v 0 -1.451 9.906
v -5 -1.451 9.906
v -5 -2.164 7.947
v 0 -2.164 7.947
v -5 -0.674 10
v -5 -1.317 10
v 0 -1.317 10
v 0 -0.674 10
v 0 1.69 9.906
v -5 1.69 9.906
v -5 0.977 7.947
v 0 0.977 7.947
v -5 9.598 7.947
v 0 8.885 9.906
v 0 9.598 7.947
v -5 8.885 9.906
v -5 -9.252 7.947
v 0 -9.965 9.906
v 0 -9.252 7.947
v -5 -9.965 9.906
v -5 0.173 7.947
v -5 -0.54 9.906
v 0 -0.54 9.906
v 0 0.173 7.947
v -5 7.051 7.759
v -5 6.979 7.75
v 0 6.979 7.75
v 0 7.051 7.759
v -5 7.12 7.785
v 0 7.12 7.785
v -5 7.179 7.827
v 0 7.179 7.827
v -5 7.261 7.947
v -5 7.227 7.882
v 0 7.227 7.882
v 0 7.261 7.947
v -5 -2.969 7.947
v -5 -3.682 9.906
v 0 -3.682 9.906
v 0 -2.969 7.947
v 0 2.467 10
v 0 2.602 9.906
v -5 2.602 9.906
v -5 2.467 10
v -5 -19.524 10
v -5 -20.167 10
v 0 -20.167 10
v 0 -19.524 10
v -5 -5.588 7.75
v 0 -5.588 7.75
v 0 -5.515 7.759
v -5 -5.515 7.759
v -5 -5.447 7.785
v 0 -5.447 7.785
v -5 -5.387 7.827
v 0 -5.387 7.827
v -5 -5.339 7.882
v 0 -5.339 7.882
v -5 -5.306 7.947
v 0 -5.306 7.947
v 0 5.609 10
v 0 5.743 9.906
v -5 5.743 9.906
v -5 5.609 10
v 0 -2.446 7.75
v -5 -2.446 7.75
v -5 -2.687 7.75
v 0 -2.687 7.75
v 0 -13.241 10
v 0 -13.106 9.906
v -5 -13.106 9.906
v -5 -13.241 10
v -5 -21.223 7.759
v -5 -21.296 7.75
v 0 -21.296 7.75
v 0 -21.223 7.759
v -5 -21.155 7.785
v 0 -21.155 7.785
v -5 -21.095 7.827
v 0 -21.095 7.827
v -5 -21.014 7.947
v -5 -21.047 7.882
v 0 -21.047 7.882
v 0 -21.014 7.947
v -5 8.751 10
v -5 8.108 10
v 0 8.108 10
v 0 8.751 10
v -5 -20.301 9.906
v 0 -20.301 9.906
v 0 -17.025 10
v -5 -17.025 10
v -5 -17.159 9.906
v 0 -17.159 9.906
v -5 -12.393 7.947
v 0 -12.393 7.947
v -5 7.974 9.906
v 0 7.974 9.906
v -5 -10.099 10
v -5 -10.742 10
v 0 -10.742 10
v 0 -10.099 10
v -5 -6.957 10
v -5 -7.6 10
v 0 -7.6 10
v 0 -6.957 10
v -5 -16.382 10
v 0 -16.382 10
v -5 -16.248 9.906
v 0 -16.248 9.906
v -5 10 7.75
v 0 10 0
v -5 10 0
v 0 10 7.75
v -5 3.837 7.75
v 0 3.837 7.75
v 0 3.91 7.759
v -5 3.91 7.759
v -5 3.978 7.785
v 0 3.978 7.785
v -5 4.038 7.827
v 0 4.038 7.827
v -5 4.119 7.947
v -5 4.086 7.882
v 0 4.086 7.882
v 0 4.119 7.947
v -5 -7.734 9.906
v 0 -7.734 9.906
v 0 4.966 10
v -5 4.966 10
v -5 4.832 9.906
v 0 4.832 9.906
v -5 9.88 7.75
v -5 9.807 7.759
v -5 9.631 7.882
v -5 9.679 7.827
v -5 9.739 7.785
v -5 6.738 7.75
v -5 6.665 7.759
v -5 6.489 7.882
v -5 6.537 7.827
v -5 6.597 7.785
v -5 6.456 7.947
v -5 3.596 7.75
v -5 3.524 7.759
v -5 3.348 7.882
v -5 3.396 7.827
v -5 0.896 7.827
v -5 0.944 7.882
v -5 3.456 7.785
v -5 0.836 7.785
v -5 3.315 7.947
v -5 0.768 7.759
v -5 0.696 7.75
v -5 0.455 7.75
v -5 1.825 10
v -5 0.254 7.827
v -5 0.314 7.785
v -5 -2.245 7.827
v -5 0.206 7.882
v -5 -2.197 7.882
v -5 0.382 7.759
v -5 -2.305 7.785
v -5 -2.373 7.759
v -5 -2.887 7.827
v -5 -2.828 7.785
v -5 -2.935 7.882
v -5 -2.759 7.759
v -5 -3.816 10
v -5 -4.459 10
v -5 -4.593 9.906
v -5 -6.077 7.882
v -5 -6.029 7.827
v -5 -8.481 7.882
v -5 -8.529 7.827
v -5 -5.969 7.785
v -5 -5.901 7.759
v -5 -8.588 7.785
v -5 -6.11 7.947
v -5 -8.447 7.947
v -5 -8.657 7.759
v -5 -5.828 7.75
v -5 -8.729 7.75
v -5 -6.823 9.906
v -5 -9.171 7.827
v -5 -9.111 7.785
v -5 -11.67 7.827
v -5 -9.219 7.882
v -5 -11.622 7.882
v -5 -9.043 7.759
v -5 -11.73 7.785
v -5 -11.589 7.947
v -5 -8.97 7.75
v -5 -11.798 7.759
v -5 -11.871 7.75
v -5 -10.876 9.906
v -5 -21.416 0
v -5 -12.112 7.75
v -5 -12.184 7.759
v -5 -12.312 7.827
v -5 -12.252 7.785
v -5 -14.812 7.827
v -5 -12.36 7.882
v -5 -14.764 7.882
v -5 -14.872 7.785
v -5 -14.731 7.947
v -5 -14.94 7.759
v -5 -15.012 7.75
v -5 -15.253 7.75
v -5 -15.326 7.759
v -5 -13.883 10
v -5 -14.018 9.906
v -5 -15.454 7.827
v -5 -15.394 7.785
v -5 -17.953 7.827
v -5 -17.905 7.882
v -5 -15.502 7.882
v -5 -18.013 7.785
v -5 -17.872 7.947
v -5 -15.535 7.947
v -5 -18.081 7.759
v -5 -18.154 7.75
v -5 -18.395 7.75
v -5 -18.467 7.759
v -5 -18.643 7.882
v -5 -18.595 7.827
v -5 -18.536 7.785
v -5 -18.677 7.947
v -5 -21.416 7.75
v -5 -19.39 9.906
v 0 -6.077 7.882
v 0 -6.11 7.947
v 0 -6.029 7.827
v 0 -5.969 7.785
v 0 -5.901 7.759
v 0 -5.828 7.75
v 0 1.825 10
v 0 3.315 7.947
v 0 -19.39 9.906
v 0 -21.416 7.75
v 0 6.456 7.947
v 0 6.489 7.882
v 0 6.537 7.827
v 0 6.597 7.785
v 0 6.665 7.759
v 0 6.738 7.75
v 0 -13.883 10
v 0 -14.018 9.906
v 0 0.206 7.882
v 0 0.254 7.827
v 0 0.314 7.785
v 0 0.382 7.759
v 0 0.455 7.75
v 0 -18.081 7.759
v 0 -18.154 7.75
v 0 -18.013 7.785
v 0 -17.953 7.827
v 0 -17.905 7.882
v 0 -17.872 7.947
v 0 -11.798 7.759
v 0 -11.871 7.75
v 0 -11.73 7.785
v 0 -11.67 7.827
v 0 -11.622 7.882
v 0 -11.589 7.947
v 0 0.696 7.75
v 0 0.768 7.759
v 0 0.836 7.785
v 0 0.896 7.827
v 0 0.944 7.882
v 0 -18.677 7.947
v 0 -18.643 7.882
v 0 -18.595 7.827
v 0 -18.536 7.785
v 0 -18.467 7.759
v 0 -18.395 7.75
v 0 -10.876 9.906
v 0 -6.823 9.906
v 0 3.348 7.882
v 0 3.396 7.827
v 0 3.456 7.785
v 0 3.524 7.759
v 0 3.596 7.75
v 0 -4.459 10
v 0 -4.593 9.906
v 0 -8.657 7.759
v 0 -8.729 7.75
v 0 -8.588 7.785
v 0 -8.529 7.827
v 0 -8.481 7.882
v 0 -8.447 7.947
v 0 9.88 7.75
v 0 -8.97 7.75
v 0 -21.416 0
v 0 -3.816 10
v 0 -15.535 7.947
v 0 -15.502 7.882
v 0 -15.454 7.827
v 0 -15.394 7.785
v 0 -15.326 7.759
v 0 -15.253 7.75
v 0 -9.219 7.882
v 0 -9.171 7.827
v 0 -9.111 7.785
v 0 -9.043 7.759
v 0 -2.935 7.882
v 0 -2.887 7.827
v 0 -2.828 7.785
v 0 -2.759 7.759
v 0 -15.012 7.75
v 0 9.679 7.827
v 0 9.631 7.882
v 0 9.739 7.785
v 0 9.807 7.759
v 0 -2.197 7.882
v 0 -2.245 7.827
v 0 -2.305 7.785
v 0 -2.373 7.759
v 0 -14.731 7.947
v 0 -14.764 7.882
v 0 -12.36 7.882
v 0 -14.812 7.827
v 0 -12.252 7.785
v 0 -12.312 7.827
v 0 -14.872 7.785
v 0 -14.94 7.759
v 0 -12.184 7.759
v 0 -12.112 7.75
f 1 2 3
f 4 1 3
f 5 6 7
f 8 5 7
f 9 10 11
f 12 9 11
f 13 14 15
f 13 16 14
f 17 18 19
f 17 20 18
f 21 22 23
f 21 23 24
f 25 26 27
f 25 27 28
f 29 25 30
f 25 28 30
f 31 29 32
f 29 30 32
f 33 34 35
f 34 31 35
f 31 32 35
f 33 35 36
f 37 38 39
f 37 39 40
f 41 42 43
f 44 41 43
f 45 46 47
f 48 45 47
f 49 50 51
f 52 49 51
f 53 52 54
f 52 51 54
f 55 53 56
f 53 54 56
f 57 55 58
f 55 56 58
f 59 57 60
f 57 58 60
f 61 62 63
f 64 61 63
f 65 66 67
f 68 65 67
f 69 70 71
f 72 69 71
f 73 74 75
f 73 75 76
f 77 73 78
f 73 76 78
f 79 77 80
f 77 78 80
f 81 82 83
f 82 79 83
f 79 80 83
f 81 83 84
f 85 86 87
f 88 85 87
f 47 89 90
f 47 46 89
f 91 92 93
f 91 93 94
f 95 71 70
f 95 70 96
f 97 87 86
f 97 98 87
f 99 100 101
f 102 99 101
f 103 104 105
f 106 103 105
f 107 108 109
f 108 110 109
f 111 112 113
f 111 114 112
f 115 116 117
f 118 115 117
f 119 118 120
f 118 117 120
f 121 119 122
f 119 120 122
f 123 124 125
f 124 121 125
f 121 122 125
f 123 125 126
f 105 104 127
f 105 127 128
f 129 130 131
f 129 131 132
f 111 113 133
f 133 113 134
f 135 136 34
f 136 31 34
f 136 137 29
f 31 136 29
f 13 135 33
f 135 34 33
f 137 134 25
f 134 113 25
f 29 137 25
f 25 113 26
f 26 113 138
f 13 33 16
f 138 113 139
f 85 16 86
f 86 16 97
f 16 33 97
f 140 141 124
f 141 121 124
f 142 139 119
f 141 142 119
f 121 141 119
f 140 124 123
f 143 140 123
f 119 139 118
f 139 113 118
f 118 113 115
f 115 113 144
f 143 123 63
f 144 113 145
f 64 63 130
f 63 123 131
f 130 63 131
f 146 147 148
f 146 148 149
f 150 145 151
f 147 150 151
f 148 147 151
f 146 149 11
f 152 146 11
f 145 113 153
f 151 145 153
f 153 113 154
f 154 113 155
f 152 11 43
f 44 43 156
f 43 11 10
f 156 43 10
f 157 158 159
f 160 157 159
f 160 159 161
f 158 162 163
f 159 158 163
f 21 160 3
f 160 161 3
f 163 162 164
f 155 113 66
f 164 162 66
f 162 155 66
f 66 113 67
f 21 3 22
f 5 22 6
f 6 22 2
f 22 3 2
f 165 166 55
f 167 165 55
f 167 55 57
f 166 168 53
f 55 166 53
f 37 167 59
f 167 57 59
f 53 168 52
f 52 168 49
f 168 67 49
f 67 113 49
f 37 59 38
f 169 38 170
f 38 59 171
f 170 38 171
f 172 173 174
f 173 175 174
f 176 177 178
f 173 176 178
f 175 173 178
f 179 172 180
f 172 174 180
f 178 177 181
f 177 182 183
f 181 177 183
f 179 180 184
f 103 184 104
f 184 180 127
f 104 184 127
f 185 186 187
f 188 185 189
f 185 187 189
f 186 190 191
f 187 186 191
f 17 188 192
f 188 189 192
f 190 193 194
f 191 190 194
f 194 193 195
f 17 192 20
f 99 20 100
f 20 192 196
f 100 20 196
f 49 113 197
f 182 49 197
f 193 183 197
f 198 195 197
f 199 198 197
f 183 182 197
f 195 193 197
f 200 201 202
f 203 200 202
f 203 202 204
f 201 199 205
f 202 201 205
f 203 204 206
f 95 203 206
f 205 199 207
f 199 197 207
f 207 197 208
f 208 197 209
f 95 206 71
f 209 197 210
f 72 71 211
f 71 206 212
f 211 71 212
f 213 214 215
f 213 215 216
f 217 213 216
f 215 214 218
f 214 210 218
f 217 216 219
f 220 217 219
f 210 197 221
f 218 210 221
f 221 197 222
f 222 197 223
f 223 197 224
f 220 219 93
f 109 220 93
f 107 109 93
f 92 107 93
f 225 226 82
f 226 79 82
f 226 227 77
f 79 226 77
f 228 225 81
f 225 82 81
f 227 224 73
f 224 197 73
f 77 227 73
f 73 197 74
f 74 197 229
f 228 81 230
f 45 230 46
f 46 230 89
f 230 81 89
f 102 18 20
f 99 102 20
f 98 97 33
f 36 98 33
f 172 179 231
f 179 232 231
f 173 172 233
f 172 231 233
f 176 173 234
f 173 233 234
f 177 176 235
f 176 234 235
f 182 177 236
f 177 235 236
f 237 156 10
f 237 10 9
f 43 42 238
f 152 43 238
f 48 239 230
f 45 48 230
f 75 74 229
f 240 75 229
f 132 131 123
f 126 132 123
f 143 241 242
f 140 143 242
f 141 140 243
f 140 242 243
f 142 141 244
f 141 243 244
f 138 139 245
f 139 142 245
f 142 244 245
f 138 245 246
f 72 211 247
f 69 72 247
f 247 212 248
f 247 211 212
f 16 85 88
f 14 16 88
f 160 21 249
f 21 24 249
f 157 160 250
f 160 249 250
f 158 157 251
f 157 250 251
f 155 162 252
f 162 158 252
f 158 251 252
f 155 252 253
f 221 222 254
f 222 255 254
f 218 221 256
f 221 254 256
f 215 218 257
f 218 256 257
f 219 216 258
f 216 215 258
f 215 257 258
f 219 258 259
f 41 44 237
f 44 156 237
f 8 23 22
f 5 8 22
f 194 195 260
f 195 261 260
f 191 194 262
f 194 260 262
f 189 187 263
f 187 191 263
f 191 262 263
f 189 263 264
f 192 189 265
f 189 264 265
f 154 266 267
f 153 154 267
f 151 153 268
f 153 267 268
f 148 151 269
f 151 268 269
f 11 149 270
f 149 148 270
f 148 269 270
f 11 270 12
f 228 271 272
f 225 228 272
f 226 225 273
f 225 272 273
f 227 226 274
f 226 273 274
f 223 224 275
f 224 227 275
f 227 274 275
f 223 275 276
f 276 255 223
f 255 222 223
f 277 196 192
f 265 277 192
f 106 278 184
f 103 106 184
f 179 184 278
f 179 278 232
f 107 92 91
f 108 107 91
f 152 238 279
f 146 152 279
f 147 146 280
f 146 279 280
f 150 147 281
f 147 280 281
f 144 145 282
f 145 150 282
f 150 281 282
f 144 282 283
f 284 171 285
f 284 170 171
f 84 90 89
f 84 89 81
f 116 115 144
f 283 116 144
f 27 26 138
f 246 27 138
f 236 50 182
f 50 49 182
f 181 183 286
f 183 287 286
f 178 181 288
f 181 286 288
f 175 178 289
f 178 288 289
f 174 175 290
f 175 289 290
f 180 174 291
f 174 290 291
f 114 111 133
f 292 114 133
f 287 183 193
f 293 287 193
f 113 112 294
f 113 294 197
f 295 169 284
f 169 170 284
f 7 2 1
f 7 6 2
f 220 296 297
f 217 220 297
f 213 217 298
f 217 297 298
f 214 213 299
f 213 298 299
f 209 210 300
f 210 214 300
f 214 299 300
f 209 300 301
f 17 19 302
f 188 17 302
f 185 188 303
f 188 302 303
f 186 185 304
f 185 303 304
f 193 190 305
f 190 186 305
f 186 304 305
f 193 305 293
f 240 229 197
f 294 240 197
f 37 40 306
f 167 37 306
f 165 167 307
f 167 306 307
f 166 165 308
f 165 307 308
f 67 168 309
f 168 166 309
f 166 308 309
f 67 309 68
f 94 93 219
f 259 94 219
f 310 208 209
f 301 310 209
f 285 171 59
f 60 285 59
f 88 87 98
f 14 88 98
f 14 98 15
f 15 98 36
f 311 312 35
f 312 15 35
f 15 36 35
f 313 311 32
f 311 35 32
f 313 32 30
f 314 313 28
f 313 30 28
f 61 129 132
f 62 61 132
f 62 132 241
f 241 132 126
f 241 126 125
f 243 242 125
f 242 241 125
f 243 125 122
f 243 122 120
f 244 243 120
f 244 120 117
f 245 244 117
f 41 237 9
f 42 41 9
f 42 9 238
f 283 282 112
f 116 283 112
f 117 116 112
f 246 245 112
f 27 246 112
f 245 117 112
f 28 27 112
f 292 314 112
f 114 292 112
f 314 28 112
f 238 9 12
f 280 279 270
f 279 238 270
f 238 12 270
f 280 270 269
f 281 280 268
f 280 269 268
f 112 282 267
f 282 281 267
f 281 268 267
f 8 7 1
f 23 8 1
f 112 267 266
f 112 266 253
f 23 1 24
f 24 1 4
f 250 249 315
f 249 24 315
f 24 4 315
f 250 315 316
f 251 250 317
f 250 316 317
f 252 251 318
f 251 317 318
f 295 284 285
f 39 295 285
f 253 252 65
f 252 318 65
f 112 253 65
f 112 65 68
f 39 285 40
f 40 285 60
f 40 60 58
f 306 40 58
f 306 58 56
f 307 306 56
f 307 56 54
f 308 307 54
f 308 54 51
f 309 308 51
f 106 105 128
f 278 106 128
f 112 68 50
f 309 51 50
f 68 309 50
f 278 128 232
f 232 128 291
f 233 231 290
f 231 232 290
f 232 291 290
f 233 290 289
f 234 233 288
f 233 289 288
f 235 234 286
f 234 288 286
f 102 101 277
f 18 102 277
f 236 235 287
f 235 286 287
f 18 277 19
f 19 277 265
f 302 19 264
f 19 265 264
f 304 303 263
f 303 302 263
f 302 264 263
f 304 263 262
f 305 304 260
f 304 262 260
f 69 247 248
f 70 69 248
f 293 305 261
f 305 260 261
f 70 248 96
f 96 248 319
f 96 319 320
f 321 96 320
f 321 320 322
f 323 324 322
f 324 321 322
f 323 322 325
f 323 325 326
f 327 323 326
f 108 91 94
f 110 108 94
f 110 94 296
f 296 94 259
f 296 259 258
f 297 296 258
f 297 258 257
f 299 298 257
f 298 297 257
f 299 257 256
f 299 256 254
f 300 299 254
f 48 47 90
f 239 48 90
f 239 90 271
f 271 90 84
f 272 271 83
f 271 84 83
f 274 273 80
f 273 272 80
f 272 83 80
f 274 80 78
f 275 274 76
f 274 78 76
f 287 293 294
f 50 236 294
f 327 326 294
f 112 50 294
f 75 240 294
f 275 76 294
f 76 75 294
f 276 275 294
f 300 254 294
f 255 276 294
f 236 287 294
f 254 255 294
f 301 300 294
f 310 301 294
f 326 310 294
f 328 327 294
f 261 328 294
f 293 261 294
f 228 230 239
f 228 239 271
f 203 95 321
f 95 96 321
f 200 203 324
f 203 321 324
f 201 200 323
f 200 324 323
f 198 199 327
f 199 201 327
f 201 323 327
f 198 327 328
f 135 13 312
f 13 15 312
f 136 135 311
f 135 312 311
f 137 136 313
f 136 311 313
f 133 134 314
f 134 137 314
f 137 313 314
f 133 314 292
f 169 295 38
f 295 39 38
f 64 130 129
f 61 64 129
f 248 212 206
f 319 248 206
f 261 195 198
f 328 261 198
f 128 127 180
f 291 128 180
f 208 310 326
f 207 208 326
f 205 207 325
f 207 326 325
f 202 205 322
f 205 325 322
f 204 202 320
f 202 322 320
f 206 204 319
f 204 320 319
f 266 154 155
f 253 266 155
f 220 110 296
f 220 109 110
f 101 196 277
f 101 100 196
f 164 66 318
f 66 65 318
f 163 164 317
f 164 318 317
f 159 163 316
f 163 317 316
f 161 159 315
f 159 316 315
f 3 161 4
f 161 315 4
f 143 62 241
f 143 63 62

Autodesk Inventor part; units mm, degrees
ref_plane "YZ Plane" through (0, 0, 0) normal (1, 0, 0) x (0, 1, 0)
ref_plane "XZ Plane" through (0, 0, 0) normal (0, 1, 0) x (-1, 0, 0)
ref_plane "XY Plane" through (0, 0, 0) normal (0, 0, 1) x (1, 0, 0)
sketch "スケッチ3" plane through (0, 0, 0) normal (0, 1, 0) x (-1, 0, 0)
  line L0 (0, 0) -> (5, 0)
  line L1 (5, 0) -> (5, 10)
  line L2 (5, 10) -> (0, 10)
  line L3 (0, 10) -> (0, 0)
  line L4 (0, 6) -> (-4, 6)
  line L5 (-4, 6) -> (-4, 4)
  line L6 (-4, 4) -> (0, 4)
  line L7 (0, 4) -> (0, 6)
  line L8 (-4, 25) -> (-39, 25)
  line L9 (-39, 25) -> (-39, -15)
  line L10 (-39, -15) -> (-4, -15)
  line L11 (-4, -15) -> (-4, 25)
  point P0 (0, 5)
  point P1 (0, 4)
  dimension "d5" = 5
  dimension "d6" = 10
  dimension "d7" = 4
  dimension "d8" = 2
  dimension "d9" = 35
  dimension "d10" = 4
  dimension "d11" = 40
  dimension "d12" = 20
extrude "押し出し2" add sketch "スケッチ3" along normal blind 10 and the other way blind 30 contours L3 L2 L1 L0
extrude "押し出し3" [suppressed]
sketch "スケッチ4" plane through (-5, -30, 10) normal (-1, 0, 0) x (0, 0, 1)
  line L0 (0, 38.8506) -> (-2.25, 39.6696)
  line L1 (0, 0) -> (0, 40) projected
  line L2 (0, 38.0078) -> (-2.25, 37.1888)
  line L3 (-10, 40) -> (0, 40) projected
  line L4 (0, 38.4292) -> (-2.25, 38.4292)
  line L5 (0, 40) -> (-10, 40) projected
  line L6 (-1, 40) -> (-1, 36.8584)
  line L7 (-2.25, 40) -> (-2.25, 36.8584)
  line L8 (0, 36.8584) -> (-2.25, 36.8584)
  line L9 (-1, 40) -> (-1, 39.2146)
  line L10 (-1, 39.2146) -> (-1, 38.4292)
  line L11 (-1, 38.4292) -> (-1, 37.6438)
  line L12 (-1, 37.6438) -> (-1, 36.8584)
  point P0 (-10, 30)
  dimension "d21" = 20
  dimension "d23" = 1
  dimension "d24" = 1.25
  dimension "d25" = 1.5708
  dimension "d27" = 1.5708
  dimension "d28" = 20
extrude "押し出し4" cut sketch "スケッチ4" against normal blind 5 contours L0 L6 L3 L1 | L0 L7 L3 L6 | L1 L8 L6 L2 | L6 L8 L7 L2
fillet "フィレット1" radius 0.3 2 edges at (-2.5, 9.6696, 7.75) (-2.5, 7.1888, 7.75)
chamfer "面取り1" distance 0.1 angle 45 2 edges at (-2.5, 8.8506, 10) (-2.5, 8.0078, 10)
pattern_linear "矩形状パターン1" count 10 spacing 3.1416 along (0, -1, 0) of "押し出し4", "フィレット1", "面取り1"
sketch "スケッチ5" plane through (-5, -30, 0) normal (-1, 0, 0) x (0, 0, 1)
  line L0 (10, 8.5841) -> (10, 0) projected
  line L1 (10, 8.5841) -> (0, 8.5841)
  line L2 (0, 8.5841) -> (0, 0)
  line L3 (0, 0) -> (10, 0)
  line L4 (10, 0) -> (10, 8.5841)
  point P0 (0, 30)
extrude "押し出し5" cut sketch "スケッチ5" against normal blind 10
equation "\"d12\" = 0.5 * d11"
equation "\"d23\" = module"
equation "\"d24\" = 1.25 * module"
equation "\"d25\" = 1.5708 * module"
equation "\"d27\" = d25"
equation "\"d28\" = d21"
equation "\"d37\" = 3.14159 * module"
equation "\"module\" = 1"
properties part number "tume"
